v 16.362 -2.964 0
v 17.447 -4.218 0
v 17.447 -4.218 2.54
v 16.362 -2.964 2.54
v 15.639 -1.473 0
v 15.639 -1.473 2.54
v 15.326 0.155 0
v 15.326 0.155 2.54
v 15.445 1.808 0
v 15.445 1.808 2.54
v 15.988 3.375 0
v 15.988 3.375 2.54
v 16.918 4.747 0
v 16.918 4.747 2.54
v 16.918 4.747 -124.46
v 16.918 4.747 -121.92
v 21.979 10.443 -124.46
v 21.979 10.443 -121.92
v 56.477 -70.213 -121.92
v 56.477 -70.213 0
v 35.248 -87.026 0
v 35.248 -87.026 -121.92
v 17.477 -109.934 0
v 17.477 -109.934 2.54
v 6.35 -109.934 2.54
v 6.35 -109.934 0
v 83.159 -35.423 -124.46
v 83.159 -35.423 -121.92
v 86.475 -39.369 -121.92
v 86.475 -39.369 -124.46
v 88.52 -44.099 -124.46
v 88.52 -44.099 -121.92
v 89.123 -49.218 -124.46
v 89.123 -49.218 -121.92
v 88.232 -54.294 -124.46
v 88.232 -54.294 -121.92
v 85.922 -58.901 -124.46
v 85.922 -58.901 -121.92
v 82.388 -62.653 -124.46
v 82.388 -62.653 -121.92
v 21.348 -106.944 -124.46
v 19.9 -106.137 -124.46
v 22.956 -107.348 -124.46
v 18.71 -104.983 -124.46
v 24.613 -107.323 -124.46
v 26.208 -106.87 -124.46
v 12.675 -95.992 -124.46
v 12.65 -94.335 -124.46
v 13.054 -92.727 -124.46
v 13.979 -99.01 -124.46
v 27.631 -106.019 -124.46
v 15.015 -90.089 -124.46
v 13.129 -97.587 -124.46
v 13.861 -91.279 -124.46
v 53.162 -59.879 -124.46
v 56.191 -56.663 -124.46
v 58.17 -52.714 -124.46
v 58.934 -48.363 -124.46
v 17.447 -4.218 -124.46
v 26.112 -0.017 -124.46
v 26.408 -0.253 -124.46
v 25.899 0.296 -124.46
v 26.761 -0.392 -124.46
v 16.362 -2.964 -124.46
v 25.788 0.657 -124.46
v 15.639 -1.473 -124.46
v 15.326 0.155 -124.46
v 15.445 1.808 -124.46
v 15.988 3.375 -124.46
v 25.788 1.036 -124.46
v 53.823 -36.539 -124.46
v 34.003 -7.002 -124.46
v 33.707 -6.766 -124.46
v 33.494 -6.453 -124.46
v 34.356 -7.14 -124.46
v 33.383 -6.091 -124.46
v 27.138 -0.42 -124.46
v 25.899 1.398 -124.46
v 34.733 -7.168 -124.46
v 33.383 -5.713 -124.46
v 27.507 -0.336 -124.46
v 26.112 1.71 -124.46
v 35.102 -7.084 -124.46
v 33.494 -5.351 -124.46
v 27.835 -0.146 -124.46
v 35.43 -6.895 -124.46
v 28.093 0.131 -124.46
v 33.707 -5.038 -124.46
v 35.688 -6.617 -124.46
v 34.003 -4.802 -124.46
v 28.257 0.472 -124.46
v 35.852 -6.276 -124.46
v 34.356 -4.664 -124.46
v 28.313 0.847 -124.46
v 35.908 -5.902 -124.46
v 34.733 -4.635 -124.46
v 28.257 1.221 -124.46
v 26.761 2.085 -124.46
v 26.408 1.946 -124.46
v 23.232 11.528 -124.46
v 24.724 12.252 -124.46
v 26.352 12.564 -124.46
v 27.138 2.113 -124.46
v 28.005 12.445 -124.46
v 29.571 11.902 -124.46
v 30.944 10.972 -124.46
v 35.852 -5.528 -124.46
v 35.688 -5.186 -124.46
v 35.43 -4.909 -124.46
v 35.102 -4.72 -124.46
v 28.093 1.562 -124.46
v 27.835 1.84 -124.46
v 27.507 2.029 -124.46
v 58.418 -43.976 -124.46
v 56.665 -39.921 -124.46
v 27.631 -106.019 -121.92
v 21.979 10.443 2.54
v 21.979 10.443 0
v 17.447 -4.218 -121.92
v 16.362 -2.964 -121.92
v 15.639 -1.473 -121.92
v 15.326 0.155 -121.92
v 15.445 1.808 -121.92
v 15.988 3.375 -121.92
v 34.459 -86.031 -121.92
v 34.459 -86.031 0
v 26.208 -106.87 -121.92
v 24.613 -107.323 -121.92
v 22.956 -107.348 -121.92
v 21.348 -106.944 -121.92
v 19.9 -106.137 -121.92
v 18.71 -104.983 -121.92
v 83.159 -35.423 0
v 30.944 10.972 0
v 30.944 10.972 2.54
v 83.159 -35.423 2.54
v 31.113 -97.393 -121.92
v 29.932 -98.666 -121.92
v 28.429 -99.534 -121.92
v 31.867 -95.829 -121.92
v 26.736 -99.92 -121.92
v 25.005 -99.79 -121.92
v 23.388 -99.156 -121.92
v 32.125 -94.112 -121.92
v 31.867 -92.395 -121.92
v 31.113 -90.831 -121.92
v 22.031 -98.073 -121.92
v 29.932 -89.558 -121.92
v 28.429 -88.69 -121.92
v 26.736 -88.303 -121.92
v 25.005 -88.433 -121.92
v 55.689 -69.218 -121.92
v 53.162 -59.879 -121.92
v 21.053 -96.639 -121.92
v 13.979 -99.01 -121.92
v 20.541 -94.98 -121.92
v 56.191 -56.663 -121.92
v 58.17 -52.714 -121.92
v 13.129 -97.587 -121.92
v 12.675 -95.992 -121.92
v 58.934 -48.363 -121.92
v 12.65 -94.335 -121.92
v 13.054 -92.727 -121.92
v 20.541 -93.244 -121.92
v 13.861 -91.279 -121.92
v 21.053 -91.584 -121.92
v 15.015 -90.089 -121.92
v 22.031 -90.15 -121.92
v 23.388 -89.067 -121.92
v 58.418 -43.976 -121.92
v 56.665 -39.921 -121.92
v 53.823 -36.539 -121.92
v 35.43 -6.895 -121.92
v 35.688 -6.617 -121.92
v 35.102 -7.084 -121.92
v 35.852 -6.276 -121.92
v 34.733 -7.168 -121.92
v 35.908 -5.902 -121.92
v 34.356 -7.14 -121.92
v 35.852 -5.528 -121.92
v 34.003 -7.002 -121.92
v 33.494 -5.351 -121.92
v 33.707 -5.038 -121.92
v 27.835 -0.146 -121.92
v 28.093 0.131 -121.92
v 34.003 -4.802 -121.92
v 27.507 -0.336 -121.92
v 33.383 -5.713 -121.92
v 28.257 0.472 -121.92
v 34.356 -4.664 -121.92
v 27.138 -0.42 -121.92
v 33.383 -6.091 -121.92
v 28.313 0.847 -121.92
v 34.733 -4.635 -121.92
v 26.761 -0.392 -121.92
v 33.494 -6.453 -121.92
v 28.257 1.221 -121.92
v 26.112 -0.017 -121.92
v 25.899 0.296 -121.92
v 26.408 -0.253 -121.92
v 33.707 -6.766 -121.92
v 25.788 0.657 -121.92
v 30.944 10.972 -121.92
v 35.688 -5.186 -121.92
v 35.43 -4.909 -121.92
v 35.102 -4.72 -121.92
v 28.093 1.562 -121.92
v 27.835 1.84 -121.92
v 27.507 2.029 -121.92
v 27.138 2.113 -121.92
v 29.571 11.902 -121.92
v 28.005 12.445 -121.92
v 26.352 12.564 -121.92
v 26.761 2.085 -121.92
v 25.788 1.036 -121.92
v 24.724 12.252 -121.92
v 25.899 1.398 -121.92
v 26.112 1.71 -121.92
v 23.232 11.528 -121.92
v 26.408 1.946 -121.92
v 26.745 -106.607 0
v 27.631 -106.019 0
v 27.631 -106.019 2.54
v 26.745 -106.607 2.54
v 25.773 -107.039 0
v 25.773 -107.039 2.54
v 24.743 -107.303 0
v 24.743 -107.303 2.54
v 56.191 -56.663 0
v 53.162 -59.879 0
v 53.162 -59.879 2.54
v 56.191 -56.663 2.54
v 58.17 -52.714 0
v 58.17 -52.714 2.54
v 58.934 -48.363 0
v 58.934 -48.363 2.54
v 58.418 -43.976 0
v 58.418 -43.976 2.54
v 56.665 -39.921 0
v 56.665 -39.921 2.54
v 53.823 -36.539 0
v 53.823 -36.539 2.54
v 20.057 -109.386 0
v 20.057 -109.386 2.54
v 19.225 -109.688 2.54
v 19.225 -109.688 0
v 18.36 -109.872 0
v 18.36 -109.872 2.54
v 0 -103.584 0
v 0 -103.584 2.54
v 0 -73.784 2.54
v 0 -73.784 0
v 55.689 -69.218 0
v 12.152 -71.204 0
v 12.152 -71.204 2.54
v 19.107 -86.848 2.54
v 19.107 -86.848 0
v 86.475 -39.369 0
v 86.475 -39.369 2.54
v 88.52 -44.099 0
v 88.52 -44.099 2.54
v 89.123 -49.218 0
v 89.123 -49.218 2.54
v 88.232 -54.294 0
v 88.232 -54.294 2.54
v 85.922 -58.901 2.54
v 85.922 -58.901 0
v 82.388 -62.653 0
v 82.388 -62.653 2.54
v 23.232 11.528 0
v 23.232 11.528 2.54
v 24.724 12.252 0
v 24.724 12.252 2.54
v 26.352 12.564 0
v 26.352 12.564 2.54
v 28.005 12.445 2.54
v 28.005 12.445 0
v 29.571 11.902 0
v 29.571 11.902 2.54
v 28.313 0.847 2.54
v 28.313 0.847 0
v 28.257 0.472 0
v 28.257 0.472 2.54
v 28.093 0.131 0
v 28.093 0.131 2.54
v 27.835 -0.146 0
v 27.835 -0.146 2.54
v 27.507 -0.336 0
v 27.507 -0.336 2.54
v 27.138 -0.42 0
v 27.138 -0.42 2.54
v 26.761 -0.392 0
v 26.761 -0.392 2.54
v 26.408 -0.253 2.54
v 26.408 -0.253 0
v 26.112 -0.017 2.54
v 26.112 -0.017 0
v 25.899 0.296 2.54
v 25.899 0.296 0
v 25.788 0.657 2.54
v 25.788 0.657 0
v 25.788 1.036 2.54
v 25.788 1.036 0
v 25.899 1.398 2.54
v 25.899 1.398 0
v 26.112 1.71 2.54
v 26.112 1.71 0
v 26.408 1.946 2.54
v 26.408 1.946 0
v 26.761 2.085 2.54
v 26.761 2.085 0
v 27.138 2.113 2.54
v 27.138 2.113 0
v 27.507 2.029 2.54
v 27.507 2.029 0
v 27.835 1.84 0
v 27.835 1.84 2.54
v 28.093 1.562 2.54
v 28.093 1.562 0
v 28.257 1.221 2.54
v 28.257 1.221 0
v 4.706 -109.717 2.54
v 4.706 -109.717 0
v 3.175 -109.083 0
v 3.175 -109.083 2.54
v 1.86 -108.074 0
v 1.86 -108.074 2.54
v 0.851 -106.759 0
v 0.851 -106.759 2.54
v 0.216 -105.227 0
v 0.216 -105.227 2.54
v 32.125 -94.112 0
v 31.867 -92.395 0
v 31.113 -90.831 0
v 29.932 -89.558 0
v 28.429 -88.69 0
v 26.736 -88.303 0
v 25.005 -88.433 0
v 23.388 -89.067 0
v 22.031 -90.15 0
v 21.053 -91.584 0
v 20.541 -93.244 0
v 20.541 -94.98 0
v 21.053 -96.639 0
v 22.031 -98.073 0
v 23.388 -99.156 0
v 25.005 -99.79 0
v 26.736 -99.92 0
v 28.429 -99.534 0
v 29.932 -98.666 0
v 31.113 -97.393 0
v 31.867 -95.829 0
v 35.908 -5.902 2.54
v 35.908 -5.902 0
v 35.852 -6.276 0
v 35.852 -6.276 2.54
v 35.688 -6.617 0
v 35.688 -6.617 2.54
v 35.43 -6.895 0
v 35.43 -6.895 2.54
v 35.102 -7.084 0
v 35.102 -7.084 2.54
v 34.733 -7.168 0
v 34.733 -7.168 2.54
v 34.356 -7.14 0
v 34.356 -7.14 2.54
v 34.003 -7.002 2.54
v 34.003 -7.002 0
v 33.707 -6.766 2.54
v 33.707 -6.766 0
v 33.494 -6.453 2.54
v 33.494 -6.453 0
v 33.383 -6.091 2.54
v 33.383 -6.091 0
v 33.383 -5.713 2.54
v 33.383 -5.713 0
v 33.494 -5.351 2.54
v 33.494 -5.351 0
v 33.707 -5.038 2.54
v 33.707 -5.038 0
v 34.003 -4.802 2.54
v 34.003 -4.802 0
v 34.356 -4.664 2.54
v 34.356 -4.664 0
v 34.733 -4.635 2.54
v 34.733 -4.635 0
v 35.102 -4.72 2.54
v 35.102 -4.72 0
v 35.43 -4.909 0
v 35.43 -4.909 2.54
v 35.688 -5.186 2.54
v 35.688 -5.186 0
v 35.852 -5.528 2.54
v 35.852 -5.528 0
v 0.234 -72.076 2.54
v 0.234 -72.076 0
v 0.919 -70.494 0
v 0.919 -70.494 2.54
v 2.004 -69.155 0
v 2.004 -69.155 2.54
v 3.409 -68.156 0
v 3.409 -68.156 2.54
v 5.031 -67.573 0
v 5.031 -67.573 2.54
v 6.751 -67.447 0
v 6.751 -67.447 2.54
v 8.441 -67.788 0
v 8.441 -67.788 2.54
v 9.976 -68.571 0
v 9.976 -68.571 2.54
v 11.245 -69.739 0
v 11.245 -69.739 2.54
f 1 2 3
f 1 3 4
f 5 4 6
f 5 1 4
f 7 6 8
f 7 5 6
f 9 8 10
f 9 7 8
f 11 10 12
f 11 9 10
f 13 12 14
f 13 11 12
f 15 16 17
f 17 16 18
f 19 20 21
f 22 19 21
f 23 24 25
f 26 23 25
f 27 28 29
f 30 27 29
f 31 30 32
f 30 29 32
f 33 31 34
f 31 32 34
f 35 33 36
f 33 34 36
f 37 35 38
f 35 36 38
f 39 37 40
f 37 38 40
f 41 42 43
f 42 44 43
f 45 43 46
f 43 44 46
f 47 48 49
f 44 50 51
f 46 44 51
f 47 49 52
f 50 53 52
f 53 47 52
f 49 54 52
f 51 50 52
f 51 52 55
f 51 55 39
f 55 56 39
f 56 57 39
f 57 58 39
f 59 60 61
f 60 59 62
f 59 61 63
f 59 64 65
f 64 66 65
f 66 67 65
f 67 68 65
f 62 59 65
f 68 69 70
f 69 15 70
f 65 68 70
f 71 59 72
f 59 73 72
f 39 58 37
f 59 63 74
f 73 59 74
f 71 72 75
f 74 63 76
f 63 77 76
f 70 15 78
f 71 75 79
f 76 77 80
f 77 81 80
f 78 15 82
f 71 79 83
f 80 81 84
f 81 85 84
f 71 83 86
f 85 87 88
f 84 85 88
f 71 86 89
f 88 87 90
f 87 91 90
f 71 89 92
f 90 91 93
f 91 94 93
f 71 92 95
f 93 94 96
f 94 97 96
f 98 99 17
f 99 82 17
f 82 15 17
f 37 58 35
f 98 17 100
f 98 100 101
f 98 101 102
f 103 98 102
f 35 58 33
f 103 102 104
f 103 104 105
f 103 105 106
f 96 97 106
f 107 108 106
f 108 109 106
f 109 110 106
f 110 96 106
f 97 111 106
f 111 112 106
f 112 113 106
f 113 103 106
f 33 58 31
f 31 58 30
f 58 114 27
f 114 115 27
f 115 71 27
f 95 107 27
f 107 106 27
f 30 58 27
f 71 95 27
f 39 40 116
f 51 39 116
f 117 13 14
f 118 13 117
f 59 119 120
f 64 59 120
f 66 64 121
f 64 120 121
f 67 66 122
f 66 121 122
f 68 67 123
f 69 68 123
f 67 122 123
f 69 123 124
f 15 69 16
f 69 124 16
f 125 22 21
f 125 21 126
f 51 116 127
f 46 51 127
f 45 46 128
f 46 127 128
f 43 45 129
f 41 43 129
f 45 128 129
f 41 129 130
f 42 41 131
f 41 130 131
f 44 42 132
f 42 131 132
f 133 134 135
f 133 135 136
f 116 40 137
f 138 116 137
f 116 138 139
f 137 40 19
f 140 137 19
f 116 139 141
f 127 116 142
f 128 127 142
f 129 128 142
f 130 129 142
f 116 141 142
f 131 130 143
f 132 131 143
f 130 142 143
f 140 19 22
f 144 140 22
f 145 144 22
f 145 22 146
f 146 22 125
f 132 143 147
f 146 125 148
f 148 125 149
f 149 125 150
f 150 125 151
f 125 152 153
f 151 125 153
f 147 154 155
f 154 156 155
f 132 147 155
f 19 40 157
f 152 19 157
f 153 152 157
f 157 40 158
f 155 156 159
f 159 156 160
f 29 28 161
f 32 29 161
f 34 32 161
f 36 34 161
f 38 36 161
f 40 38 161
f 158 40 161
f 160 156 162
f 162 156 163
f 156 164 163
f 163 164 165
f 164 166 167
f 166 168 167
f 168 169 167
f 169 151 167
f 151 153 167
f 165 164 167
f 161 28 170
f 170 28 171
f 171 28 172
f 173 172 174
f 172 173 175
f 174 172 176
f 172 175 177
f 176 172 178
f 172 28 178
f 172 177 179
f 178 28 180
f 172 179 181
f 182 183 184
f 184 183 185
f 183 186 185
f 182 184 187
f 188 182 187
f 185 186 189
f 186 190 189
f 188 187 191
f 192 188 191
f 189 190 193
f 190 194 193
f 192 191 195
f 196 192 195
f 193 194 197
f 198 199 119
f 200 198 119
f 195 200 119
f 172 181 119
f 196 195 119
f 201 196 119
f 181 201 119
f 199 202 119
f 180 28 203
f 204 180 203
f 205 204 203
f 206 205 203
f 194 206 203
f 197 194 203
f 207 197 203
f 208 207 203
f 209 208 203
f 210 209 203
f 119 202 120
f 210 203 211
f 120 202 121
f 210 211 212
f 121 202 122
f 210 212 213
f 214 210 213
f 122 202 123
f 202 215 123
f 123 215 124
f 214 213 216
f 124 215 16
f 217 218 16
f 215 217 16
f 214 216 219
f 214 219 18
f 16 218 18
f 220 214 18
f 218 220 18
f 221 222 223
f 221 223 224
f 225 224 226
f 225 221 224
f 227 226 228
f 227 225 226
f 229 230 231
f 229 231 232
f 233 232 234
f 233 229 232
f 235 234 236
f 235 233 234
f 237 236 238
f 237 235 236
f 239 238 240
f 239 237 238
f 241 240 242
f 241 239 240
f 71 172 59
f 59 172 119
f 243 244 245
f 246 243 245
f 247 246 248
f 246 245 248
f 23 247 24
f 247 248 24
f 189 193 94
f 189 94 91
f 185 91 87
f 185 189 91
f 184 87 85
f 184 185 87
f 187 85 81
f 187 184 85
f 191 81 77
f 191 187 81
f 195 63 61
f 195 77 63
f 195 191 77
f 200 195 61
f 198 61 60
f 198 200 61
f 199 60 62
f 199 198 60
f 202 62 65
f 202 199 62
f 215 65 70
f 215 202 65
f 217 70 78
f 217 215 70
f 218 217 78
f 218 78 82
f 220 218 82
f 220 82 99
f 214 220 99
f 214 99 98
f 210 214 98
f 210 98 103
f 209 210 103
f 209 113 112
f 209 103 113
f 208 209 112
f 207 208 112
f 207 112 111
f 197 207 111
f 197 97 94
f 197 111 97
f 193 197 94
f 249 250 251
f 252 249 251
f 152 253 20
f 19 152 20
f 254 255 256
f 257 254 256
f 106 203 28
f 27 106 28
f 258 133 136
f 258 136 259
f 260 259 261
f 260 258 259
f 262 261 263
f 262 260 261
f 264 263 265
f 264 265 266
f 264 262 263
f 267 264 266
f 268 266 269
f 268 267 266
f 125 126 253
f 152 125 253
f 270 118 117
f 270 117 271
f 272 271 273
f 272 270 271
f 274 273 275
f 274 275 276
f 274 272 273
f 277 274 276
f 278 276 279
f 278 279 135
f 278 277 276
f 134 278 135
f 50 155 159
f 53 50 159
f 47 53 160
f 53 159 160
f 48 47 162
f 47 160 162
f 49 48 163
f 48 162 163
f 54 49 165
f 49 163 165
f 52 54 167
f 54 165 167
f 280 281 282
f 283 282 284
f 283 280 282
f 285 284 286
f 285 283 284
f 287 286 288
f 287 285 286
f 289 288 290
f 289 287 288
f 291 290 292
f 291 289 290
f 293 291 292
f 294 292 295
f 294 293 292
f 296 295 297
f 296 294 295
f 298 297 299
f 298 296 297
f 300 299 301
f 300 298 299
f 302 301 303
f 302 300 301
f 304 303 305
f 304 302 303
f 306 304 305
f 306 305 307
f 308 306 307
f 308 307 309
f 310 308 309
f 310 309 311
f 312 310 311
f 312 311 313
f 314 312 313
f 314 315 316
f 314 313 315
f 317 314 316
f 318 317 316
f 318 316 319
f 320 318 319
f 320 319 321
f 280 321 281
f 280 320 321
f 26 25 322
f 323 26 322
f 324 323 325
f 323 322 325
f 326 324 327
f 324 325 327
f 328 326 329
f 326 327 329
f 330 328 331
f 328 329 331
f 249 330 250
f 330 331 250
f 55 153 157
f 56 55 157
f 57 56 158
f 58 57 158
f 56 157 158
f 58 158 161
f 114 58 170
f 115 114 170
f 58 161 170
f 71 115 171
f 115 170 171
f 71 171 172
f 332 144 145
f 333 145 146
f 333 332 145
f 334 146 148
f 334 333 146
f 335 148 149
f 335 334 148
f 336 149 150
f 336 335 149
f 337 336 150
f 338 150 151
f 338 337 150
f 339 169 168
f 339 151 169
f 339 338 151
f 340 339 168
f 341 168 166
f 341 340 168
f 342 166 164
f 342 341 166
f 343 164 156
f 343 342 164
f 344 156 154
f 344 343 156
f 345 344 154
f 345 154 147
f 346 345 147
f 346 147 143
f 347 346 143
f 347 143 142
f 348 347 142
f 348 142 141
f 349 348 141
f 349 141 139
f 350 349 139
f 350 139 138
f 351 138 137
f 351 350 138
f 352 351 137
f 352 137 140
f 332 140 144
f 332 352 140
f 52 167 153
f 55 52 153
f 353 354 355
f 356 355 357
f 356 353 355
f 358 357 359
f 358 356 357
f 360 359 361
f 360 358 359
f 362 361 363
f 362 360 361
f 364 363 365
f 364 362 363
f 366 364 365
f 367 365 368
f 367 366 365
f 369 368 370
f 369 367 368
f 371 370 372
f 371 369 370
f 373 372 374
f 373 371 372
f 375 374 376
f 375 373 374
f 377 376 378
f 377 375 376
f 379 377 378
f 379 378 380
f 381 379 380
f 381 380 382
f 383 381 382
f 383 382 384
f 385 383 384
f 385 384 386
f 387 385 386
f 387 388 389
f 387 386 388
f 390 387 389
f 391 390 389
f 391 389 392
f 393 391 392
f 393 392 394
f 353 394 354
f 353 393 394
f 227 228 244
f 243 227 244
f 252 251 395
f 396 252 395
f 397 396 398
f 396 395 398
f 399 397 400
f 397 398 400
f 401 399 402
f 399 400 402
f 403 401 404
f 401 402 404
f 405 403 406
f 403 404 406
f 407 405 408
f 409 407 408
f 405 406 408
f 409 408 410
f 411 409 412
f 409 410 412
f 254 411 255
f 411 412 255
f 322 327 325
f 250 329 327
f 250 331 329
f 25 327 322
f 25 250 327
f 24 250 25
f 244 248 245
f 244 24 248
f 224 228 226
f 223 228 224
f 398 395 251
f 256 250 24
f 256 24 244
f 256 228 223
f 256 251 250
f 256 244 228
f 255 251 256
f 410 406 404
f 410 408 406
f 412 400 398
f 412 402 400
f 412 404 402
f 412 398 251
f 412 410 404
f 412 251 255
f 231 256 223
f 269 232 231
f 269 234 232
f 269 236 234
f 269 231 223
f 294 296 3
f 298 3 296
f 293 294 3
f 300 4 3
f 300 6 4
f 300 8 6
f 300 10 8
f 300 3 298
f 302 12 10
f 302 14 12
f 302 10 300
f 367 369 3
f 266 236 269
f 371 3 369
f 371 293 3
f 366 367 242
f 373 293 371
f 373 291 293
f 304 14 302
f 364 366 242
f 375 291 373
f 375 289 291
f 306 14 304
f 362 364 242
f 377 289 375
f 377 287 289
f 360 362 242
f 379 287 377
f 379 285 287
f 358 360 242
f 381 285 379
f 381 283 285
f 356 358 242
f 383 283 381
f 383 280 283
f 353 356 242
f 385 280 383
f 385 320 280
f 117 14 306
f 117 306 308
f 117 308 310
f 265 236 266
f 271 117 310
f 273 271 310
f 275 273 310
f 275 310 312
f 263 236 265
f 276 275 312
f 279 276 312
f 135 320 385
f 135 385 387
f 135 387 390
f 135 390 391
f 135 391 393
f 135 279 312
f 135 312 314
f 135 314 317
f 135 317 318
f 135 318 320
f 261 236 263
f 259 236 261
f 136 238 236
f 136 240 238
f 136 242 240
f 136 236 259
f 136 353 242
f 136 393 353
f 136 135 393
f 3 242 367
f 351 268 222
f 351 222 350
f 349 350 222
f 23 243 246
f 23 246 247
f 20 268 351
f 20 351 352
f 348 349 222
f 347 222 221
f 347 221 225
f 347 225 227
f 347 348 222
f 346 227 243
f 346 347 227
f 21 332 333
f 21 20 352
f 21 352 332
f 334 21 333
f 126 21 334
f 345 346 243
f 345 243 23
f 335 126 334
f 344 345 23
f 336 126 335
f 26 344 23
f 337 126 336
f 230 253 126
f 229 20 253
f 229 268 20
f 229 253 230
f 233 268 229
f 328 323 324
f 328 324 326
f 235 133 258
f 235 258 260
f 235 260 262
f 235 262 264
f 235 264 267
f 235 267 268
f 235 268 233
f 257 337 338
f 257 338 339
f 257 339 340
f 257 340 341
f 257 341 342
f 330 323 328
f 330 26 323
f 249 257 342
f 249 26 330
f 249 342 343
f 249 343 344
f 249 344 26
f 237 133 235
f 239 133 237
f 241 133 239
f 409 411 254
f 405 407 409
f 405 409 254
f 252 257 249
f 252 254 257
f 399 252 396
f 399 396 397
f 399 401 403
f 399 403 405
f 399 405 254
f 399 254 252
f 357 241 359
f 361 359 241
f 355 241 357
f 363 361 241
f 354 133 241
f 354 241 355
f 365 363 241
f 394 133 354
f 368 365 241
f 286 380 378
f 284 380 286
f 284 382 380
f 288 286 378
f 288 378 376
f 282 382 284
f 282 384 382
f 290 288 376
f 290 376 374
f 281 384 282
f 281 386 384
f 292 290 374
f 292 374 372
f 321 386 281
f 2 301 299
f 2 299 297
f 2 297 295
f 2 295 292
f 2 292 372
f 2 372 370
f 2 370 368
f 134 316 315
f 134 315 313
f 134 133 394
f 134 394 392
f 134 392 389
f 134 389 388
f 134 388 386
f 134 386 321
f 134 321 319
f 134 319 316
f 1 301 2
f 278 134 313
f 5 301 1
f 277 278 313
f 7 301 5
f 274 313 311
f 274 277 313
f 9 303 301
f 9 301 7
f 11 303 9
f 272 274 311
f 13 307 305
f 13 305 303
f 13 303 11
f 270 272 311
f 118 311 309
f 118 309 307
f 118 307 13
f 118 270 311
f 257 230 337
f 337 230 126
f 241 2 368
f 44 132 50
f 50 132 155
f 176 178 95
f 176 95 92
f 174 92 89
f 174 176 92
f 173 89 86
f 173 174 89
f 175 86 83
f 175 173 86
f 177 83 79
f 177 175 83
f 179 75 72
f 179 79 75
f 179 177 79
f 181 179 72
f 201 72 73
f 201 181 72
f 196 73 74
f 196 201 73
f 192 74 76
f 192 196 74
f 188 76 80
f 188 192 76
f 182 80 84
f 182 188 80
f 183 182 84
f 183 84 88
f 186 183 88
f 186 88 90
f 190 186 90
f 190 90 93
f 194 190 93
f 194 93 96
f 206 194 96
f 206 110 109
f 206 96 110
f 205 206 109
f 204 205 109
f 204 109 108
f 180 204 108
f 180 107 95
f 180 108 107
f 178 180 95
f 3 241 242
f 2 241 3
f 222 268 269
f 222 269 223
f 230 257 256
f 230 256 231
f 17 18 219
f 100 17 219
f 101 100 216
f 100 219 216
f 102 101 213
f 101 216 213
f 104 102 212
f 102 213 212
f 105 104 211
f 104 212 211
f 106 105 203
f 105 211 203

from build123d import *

# Parameters (mm, degrees)
BOSS_EXTRUDE1_DEPTH = 2.54
SKETCH3_R           = 5.824660453
BOSS_EXTRUDE2_DEPTH = 63.5
BOSS_EXTRUDE3_DEPTH = 123.444
SKETCH5_R           = 1.27
CUT_EXTRUDE1_DEPTH  = 189.695241466
BOSS_EXTRUDE5_DEPTH = 2.54


with BuildPart() as part:
    # Sketch2 → Boss-Extrude1 (new body)
    with BuildSketch(Plane.XY):
        with BuildLine():
            Line((30.943753448, 10.972254104), (83.159468074, -35.423237554))
            ThreePointArc((83.159468074, -35.423237554), (89.122580616, -49.217847067), (82.38831151, -62.652860369))
            Line((82.38831151, -62.652860369), (27.63050793, -106.018808383))
            ThreePointArc((27.63050793, -106.018808383), (22.955852809, -107.34845989), (18.710166876, -104.98318515))
            Line((18.710166876, -104.98318515), (13.979336184, -99.009606578))
            ThreePointArc((13.979336184, -99.009606578), (12.649684678, -94.334951456), (15.014959417, -90.089265524))
            Line((15.014959417, -90.089265524), (53.161684307, -59.878614615))
            ThreePointArc((53.161684307, -59.878614615), (58.933914969, -48.362888928), (53.822675647, -36.538937916))
            Line((53.822675647, -36.538937916), (17.446883148, -4.217771969))
            ThreePointArc((17.446883148, -4.217771969), (15.325686693, 0.154973076), (16.917771969, 4.746883148))
            Line((16.917771969, 4.746883148), (21.979098332, 10.443142925))
            ThreePointArc((21.979098332, 10.443142925), (26.351843377, 12.56433938), (30.943753448, 10.972254104))
        make_face()
    boss_extrude1 = extrude(amount=BOSS_EXTRUDE1_DEPTH)

    # Sketch3 → Boss-Extrude2 (add)
    with BuildSketch(Plane.XY.offset(2.54)):
        with Locations((26.300715817, -94.111678043)):
            Circle(SKETCH3_R)
    boss_extrude2 = extrude(amount=-BOSS_EXTRUDE2_DEPTH)

    # Mirror1: Boss-Extrude1, Boss-Extrude2 across plane
    add(boss_extrude1.mirror(Plane(origin=(26.300715817, -94.111678043, -60.96), x_dir=(1, 0, 0), z_dir=(0, 0, 1))))
    add(boss_extrude2.mirror(Plane(origin=(26.300715817, -94.111678043, -60.96), x_dir=(1, 0, 0), z_dir=(0, 0, 1))))

    # Sketch4 → Boss-Extrude3 (add)
    with BuildSketch(Plane(origin=(0, 0, 0), x_dir=(-1, 0, 0), z_dir=(0, 0, -1))):
        Polygon((-35.247552365, -87.026148251), (-34.459080583, -86.030551823), (-55.688722292, -69.2175411), (-56.477194074, -70.213137529), align=None)
    extrude(amount=BOSS_EXTRUDE3_DEPTH)

    # Sketch5 → Cut-Extrude1 (cut, through all)
    with BuildSketch(Plane(origin=(0, 0, 2.54), x_dir=(-1, 0, 0), z_dir=(0, 0, -1))):
        with Locations(Location((-27.043448187, 0.846577886, 0), (0, 0, 180))):
            Circle(SKETCH5_R)
        with Locations(Location((-34.638461223, -5.901857264, 0), (0, 0, 180))):
            Circle(SKETCH5_R)
    extrude(amount=CUT_EXTRUDE1_DEPTH, mode=Mode.SUBTRACT)

    # Sketch7 → Boss-Extrude5 (add)
    with BuildSketch(Plane.XY.offset(2.54)):
        with BuildLine():
            Line((27.63050793, -106.018808383), (20.056626411, -109.386083488))
            ThreePointArc((20.056626411, -109.386083488), (18.795524409, -109.795283294), (17.476939915, -109.933694534))
            Line((17.476939915, -109.933694534), (6.35, -109.933694534))
            ThreePointArc((6.35, -109.933694534), (1.859871939, -108.073822594), (0, -103.583694534))
            Line((0, -103.583694534), (0, -73.78416115))
            ThreePointArc((0, -73.78416115), (5.031415506, -67.57257239), (12.152388955, -71.204474655))
            Line((12.152388955, -71.204474655), (27.63050793, -106.018808383))
        make_face()
    extrude(amount=-BOSS_EXTRUDE5_DEPTH)


solid = part.part
